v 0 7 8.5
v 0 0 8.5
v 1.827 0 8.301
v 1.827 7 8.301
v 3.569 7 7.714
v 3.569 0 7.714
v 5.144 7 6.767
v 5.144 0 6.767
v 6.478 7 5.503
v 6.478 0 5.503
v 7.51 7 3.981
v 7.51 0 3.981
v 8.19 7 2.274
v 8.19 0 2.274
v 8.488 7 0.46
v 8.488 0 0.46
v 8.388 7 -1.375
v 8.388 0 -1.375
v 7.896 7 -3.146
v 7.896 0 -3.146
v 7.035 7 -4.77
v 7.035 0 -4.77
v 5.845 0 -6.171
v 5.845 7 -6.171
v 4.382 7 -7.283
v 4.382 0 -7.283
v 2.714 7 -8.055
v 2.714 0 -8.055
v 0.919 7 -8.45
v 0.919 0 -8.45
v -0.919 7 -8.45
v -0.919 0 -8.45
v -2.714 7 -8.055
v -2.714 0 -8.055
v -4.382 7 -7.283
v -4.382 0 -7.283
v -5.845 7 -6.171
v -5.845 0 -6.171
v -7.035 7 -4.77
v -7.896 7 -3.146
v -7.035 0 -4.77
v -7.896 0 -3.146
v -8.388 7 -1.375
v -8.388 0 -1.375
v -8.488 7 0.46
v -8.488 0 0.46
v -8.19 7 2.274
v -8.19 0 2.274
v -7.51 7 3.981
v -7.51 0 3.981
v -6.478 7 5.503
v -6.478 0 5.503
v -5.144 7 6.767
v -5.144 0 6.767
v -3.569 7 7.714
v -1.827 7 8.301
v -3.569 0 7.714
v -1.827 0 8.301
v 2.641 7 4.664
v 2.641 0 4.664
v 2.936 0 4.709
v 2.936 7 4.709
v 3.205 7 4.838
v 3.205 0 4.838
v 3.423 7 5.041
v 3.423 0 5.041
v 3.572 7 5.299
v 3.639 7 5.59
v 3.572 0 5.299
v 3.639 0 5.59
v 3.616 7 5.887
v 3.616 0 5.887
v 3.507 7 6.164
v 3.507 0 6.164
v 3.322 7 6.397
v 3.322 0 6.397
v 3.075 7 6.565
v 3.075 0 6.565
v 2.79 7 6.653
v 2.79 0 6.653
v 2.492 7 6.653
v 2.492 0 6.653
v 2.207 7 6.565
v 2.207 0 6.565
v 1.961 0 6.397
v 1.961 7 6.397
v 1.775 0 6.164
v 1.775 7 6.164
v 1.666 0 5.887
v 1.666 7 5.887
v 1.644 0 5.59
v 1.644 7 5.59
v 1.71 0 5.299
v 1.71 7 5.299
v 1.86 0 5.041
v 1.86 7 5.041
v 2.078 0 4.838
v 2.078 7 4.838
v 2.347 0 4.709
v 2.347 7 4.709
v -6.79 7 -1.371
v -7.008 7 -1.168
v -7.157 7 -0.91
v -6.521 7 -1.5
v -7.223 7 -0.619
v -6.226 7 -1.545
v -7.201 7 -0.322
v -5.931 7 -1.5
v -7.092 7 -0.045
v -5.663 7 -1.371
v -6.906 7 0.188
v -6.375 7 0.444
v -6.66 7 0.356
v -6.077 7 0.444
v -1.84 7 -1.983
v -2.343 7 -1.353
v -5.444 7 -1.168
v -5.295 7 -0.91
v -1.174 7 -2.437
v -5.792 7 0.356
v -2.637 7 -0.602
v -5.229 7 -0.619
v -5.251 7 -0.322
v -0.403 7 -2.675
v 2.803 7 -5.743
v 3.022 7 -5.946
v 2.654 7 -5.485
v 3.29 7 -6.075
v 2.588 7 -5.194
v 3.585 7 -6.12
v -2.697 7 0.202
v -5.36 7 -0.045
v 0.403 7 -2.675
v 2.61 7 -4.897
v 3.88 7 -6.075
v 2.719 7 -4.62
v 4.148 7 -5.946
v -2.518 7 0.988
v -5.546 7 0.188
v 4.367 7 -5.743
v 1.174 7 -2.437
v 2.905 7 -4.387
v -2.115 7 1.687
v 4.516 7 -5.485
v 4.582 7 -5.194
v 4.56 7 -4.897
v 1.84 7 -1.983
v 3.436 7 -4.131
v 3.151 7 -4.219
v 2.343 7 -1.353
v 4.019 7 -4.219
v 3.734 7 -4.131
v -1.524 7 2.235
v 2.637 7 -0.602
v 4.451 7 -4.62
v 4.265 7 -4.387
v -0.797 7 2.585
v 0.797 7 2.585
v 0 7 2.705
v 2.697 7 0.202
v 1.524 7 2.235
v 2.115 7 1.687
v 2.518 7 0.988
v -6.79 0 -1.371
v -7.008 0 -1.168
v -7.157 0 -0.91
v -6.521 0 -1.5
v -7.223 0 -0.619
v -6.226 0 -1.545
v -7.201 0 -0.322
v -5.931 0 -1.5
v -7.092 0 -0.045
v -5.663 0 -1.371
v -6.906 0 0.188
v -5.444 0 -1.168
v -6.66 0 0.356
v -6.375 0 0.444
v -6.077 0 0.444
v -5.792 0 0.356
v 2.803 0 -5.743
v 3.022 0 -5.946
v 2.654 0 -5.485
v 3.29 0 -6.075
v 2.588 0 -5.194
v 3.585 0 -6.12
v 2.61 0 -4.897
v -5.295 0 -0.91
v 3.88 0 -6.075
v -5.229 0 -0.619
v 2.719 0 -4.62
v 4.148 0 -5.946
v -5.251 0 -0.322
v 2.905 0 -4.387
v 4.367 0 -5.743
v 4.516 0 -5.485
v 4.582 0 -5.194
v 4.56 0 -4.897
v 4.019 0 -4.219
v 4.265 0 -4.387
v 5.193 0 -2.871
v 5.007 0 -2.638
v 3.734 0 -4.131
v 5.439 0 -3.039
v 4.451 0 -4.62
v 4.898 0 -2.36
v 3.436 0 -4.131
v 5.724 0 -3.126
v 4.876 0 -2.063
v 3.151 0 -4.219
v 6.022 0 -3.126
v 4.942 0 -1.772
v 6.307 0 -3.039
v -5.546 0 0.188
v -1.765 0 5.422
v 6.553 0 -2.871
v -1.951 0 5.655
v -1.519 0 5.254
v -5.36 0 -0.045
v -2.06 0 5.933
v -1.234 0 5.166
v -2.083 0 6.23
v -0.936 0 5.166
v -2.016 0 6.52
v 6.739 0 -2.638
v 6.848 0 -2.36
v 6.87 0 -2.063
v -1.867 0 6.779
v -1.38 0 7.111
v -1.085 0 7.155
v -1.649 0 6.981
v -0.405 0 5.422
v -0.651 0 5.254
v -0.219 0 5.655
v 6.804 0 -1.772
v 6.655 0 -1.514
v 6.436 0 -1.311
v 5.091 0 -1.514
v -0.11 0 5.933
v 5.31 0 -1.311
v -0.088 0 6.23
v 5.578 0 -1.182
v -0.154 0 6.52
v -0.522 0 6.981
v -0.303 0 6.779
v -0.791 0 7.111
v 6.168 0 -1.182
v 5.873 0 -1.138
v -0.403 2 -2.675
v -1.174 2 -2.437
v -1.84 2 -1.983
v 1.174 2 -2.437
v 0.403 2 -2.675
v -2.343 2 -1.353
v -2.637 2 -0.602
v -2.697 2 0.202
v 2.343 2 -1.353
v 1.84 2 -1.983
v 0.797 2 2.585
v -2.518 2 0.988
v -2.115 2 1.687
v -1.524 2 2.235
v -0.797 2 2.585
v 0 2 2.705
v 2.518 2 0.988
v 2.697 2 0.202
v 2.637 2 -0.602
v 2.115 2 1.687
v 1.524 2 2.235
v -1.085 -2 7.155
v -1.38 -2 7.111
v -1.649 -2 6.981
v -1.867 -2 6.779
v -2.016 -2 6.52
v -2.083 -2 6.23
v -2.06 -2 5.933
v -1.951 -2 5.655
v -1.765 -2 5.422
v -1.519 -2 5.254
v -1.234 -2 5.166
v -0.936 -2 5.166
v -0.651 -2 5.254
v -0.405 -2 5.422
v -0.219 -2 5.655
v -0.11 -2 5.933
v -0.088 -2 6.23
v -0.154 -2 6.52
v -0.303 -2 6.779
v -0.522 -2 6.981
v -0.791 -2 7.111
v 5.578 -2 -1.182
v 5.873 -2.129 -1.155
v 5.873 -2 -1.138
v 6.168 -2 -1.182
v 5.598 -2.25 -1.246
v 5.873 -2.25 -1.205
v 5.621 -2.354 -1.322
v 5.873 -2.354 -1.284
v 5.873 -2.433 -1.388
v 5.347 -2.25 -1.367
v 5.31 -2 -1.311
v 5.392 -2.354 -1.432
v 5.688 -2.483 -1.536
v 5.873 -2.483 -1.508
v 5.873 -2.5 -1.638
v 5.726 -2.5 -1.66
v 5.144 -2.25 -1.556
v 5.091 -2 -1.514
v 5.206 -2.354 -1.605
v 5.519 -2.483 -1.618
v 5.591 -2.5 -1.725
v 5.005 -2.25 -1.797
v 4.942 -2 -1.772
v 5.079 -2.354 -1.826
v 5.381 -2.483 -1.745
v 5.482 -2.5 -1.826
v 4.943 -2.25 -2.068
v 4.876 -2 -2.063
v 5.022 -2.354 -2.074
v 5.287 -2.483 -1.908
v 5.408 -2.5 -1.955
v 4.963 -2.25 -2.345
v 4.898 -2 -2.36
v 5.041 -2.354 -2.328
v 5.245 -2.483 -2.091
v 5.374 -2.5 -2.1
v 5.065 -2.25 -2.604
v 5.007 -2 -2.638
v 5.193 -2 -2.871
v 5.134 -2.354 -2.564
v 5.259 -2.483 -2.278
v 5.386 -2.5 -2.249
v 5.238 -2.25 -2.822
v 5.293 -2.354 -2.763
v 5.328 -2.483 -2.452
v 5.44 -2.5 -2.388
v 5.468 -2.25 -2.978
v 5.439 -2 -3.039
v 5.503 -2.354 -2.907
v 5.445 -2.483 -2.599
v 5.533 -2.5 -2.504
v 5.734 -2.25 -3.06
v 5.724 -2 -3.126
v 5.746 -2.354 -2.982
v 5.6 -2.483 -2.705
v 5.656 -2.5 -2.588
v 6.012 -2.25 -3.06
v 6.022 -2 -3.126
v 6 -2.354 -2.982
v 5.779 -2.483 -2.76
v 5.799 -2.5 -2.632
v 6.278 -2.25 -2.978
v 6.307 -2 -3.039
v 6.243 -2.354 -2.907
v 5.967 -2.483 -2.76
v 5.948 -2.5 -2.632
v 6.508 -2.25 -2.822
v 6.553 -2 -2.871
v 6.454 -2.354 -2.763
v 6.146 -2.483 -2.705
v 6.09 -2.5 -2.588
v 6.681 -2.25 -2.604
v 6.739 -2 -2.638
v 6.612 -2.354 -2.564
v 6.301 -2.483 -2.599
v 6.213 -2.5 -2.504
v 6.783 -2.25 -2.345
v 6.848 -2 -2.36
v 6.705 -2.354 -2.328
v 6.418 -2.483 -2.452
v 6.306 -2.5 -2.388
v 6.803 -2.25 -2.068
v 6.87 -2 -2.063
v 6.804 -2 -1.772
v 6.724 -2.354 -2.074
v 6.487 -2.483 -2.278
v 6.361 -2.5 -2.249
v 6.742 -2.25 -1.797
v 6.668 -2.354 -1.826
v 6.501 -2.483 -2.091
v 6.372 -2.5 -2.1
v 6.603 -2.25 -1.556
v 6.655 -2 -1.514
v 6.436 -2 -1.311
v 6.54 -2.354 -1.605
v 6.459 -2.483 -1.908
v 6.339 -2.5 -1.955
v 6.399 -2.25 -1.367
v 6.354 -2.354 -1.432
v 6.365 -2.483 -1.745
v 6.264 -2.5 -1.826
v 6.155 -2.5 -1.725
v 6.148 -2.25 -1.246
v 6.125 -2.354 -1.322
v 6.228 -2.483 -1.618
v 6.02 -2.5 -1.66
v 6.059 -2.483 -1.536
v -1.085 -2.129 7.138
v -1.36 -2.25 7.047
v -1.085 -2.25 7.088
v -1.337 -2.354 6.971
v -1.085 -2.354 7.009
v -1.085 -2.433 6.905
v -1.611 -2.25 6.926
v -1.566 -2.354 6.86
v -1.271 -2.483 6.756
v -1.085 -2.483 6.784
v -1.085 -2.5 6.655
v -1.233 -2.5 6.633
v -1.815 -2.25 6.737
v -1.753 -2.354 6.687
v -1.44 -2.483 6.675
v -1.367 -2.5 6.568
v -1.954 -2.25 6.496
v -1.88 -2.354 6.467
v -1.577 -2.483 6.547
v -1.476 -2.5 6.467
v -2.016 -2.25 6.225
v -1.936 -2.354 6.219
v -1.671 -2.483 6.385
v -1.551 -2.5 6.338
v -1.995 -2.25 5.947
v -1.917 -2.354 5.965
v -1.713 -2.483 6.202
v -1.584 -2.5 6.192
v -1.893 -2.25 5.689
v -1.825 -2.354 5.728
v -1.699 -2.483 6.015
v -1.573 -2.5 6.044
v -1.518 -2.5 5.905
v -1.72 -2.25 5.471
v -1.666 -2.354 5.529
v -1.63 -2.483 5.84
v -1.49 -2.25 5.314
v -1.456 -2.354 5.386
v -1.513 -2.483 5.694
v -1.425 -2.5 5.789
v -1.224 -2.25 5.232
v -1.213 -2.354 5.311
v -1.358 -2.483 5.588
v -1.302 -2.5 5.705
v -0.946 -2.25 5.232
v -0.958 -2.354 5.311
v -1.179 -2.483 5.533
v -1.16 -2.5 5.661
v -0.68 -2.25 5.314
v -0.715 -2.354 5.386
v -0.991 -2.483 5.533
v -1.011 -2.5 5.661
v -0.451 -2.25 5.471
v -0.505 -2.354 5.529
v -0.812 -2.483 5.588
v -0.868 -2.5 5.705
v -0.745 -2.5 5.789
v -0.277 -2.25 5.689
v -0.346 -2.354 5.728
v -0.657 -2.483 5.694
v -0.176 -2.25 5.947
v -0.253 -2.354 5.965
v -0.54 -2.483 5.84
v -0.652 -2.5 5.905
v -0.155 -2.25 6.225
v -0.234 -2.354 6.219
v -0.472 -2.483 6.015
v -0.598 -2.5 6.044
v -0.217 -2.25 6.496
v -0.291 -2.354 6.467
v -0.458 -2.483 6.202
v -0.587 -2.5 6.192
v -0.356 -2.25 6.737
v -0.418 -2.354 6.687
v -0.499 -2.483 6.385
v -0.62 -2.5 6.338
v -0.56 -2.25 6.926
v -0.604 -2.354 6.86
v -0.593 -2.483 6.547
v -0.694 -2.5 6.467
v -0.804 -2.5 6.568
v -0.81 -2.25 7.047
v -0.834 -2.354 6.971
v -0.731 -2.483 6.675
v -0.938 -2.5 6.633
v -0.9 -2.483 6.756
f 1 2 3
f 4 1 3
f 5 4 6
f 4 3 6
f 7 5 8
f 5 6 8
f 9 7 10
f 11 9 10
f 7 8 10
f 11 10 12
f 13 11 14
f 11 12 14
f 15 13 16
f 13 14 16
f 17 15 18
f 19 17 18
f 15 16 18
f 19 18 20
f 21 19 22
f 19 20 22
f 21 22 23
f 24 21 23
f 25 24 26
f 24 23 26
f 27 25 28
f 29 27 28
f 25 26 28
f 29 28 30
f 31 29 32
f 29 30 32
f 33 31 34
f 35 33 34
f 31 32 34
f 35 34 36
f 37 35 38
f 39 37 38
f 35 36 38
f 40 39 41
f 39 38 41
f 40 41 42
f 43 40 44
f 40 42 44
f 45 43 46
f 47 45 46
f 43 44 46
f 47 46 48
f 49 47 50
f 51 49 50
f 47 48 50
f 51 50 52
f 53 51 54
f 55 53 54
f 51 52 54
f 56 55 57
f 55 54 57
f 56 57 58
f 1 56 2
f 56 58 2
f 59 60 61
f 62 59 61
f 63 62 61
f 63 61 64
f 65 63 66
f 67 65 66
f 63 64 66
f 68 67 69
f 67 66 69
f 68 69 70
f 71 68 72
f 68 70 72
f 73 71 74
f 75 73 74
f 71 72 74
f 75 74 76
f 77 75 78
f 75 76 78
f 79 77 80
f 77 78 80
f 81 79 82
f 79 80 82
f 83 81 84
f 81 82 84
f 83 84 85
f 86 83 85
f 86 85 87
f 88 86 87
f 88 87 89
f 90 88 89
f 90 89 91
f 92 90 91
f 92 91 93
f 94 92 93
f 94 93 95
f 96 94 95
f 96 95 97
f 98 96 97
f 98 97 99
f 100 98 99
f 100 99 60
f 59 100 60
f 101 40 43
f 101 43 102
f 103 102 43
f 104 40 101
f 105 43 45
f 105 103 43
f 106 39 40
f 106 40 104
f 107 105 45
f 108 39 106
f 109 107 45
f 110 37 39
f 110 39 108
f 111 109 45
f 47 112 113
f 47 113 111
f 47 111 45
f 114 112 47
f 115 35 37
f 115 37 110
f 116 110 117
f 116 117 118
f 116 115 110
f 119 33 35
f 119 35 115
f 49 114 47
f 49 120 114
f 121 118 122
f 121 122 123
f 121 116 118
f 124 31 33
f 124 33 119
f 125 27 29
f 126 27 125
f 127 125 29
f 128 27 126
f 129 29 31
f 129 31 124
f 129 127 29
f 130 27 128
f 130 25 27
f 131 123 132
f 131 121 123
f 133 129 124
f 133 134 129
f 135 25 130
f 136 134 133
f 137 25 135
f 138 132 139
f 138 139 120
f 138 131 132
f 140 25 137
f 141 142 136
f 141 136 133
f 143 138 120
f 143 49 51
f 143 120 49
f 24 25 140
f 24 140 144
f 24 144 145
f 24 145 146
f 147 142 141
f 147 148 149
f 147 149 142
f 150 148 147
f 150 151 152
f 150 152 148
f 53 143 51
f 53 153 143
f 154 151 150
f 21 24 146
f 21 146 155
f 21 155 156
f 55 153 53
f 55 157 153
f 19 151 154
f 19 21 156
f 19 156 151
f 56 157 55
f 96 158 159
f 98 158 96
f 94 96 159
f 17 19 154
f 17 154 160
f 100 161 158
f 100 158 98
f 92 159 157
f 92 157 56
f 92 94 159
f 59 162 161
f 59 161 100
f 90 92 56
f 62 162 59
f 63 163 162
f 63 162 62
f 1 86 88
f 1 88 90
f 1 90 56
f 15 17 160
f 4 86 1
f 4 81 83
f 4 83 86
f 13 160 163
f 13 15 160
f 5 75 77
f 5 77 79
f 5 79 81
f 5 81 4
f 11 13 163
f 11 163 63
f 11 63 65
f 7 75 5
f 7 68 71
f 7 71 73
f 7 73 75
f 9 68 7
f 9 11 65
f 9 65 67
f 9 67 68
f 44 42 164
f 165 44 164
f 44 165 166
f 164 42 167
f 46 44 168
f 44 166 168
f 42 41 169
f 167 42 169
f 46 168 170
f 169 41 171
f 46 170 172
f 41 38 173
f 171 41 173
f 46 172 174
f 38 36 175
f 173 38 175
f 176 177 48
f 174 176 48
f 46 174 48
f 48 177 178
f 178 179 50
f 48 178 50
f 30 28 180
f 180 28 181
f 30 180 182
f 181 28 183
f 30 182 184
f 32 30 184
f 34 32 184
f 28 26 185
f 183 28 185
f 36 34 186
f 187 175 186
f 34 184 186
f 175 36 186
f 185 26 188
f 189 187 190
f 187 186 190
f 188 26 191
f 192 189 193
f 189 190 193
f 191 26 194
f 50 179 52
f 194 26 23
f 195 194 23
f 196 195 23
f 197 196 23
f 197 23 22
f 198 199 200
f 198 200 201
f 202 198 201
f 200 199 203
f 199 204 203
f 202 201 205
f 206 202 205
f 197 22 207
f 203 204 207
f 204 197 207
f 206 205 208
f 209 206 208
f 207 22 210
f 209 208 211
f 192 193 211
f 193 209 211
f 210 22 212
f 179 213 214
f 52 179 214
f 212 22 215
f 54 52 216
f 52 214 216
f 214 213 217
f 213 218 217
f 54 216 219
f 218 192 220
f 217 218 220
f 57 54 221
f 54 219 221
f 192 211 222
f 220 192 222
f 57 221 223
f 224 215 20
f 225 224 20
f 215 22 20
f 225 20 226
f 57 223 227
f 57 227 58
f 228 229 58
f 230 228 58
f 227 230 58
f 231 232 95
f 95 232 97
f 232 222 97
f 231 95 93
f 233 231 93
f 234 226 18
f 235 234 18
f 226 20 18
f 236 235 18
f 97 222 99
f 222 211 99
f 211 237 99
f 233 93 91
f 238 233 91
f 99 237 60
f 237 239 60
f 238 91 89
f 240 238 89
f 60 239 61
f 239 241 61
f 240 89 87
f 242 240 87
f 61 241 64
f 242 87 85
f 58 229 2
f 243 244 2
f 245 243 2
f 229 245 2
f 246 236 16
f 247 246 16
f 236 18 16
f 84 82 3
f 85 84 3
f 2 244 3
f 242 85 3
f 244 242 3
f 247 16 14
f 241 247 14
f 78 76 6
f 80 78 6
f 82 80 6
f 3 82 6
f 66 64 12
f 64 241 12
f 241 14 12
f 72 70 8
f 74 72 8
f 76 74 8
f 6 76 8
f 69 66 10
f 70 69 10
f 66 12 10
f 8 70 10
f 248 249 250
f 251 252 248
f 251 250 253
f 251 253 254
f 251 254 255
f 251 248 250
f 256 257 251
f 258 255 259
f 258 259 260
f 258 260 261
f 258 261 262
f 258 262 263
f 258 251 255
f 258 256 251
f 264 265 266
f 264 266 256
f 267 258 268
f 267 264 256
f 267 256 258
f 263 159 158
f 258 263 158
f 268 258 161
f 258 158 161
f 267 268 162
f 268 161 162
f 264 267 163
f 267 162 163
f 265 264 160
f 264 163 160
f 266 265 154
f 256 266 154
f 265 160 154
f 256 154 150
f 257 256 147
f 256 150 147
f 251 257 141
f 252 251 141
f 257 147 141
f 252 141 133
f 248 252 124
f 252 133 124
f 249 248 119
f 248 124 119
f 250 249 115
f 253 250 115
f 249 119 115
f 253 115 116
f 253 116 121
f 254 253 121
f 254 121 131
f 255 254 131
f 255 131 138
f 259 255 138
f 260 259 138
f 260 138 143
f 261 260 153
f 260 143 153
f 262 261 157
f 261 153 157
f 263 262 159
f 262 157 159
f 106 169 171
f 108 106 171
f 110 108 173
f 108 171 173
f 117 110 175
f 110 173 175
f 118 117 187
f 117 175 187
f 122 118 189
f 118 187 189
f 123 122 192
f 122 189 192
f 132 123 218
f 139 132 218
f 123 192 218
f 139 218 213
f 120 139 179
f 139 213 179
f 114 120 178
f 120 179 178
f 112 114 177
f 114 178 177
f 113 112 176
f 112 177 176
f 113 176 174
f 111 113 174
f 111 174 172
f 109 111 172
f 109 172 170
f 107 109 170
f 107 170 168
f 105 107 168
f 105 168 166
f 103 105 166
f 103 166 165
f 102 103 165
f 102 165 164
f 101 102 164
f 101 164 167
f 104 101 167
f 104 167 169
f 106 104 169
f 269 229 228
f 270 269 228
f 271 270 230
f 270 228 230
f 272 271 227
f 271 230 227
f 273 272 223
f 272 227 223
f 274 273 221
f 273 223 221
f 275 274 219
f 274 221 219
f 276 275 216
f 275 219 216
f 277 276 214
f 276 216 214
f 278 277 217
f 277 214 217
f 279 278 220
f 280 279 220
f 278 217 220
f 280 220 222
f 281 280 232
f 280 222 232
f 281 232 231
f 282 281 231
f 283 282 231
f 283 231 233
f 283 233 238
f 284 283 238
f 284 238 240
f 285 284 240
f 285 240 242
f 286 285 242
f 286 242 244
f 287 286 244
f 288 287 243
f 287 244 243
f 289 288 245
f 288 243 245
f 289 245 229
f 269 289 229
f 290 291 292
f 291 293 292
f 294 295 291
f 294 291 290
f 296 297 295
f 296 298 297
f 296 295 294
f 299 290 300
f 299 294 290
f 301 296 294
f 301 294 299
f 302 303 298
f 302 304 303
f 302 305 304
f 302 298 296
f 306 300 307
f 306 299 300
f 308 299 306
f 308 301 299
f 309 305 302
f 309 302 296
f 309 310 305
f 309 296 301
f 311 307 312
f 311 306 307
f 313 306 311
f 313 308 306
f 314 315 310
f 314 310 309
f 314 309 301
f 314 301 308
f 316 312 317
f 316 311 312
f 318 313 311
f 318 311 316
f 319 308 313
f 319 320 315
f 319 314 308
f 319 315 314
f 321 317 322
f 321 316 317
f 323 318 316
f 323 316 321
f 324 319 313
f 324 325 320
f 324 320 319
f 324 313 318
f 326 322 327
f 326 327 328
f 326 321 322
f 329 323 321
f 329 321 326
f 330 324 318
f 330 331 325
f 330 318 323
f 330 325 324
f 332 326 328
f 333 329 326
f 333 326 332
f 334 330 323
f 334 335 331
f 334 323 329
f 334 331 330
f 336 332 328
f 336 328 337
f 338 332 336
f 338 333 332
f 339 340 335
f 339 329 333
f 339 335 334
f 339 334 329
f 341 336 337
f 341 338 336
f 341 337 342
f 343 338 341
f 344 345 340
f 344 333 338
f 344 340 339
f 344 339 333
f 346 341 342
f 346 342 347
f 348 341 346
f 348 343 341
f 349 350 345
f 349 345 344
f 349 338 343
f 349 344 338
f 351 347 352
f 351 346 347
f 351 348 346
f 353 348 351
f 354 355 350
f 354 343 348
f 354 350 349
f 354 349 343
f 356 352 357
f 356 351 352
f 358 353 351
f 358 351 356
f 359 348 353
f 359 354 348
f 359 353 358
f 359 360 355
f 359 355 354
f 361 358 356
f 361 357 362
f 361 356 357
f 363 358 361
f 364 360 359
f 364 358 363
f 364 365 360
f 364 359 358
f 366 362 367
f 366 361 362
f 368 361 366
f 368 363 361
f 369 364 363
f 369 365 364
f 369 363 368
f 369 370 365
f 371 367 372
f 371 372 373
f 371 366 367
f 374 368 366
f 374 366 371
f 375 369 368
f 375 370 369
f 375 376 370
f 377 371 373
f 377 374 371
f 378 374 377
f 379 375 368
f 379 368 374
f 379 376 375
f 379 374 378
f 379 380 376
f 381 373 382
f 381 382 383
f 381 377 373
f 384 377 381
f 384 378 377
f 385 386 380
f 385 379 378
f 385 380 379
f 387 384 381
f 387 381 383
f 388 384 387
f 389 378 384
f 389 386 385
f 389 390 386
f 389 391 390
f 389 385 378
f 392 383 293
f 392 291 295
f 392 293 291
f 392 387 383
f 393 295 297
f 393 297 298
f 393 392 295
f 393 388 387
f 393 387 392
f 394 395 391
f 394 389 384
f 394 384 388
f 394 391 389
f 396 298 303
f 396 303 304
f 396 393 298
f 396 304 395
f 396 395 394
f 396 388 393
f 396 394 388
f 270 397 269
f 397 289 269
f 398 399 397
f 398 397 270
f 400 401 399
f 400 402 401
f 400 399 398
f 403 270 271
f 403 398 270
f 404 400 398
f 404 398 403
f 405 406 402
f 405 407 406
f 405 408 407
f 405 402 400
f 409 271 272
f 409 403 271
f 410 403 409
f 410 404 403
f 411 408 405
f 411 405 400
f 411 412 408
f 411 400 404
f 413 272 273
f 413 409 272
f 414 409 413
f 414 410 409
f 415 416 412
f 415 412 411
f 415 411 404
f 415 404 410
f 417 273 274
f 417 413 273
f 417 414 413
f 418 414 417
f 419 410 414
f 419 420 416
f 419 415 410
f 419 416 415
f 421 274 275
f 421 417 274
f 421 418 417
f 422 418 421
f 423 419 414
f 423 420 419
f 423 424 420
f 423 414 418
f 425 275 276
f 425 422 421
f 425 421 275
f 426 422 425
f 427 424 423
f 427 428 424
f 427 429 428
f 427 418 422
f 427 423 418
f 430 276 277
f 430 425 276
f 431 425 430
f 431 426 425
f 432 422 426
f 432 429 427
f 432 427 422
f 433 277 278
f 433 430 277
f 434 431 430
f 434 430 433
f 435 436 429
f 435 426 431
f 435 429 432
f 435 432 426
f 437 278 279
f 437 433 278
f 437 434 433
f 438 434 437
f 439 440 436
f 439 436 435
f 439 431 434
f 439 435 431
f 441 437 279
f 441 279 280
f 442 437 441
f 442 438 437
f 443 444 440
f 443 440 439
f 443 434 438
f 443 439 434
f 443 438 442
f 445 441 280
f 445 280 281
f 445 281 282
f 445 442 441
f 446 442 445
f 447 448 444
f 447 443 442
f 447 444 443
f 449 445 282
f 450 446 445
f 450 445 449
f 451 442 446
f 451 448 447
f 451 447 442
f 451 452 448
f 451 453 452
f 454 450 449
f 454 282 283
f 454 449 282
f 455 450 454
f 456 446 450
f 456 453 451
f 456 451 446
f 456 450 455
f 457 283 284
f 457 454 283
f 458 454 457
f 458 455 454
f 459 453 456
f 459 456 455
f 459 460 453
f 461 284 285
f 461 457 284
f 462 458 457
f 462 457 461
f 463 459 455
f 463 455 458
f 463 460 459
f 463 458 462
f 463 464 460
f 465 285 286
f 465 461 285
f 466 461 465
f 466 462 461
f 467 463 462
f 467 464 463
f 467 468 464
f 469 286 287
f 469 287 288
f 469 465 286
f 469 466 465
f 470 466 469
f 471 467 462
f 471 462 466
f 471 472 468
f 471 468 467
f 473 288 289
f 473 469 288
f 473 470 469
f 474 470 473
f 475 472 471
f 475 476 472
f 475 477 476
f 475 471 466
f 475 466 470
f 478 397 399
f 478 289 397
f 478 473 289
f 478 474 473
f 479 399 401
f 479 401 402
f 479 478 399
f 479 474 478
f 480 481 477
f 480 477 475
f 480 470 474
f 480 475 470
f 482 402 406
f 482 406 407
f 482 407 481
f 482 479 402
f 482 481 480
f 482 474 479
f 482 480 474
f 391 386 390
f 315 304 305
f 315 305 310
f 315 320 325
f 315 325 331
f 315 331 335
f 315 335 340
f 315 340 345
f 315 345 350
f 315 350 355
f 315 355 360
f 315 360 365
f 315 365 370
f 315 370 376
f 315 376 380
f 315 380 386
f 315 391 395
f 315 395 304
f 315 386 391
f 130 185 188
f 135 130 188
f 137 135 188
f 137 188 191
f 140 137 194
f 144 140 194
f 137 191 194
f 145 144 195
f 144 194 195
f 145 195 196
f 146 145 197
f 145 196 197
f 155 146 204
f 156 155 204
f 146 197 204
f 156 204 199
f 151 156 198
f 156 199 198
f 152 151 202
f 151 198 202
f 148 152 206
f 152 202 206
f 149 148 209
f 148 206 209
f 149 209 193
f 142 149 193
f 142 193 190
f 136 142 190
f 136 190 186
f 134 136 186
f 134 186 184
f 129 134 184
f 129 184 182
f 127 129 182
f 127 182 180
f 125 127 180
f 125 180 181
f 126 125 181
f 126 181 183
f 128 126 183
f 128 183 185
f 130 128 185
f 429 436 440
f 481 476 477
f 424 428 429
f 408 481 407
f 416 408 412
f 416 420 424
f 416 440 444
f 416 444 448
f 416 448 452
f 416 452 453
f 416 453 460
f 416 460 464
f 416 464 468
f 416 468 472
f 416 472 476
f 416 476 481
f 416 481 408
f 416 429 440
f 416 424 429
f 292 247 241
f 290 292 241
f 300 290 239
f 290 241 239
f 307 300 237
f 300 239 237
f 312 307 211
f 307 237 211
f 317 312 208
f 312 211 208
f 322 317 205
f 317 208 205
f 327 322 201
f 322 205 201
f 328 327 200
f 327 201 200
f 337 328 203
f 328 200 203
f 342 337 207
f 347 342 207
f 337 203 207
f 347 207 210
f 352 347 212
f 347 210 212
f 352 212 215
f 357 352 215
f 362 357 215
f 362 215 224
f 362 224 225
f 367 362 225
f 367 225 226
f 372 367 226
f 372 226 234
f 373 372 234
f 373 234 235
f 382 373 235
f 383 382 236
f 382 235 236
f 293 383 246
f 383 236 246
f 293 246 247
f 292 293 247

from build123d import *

# Parameters (mm, degrees)
SKETCH1_R           = 8.5
CYLINDER_DEPTH      = 7
SKETCH2_R           = 2.705
LUER_HOLE_DEPTH     = 5
SKETCH3_R           = 1
DOWEL_PINS_DEPTH    = 2.5
SKETCH4_R           = 1
SCREW_HOLES_DEPTH   = 14.910427743
FILLET_DOWEL_PINS_R = 0.5


with BuildPart() as part:
    # Sketch1 → Cylinder (new body)
    with BuildSketch(Plane(origin=(0, 0, 0), x_dir=(1, 0, 0), z_dir=(0, 1, 0))):
        with Locations(Location((0, 0, 0), (0, 0, 270))):
            Circle(SKETCH1_R)
    extrude(amount=CYLINDER_DEPTH)

    # Sketch2 → Luer Hole (cut)
    with BuildSketch(Plane(origin=(0, 7, 0), x_dir=(1, 0, 0), z_dir=(0, 1, 0))):
        with Locations(Location((0, 0, 0), (0, 0, 270))):
            Circle(SKETCH2_R)
    extrude(amount=-LUER_HOLE_DEPTH, mode=Mode.SUBTRACT)

    # Sketch3 → Dowel Pins (add)
    with BuildSketch(Plane.XZ):
        with Locations(Location((-1.08530111, 6.155048456, 0), (0, 0, 90))):
            Circle(SKETCH3_R)
        with Locations(Location((5.87307888, -2.137625896, 0), (0, 0, 90))):
            Circle(SKETCH3_R)
    extrude(amount=DOWEL_PINS_DEPTH)

    # Sketch4 → Screw Holes (cut, through all)
    with BuildSketch(Plane.XZ):
        with Locations(Location((-6.226216863, -0.544723392, 0), (0, 0, 270))):
            Circle(SKETCH4_R)
        with Locations(Location((2.641364136, 5.664423669, 0), (0, 0, 270))):
            Circle(SKETCH4_R)
        with Locations(Location((3.584852727, -5.119700277, 0), (0, 0, 270))):
            Circle(SKETCH4_R)
    extrude(amount=-SCREW_HOLES_DEPTH, mode=Mode.SUBTRACT)

    # Fillet Dowel Pins
    fillet_dowel_pins_edges = [part.edges().sort_by_distance(p)[0] for p in [
        (-1.08530111, -2.5, 5.155048456),
        (5.87307888, -2.5, -3.137625896),
    ]]
    fillet(fillet_dowel_pins_edges, radius=FILLET_DOWEL_PINS_R)


solid = part.part
